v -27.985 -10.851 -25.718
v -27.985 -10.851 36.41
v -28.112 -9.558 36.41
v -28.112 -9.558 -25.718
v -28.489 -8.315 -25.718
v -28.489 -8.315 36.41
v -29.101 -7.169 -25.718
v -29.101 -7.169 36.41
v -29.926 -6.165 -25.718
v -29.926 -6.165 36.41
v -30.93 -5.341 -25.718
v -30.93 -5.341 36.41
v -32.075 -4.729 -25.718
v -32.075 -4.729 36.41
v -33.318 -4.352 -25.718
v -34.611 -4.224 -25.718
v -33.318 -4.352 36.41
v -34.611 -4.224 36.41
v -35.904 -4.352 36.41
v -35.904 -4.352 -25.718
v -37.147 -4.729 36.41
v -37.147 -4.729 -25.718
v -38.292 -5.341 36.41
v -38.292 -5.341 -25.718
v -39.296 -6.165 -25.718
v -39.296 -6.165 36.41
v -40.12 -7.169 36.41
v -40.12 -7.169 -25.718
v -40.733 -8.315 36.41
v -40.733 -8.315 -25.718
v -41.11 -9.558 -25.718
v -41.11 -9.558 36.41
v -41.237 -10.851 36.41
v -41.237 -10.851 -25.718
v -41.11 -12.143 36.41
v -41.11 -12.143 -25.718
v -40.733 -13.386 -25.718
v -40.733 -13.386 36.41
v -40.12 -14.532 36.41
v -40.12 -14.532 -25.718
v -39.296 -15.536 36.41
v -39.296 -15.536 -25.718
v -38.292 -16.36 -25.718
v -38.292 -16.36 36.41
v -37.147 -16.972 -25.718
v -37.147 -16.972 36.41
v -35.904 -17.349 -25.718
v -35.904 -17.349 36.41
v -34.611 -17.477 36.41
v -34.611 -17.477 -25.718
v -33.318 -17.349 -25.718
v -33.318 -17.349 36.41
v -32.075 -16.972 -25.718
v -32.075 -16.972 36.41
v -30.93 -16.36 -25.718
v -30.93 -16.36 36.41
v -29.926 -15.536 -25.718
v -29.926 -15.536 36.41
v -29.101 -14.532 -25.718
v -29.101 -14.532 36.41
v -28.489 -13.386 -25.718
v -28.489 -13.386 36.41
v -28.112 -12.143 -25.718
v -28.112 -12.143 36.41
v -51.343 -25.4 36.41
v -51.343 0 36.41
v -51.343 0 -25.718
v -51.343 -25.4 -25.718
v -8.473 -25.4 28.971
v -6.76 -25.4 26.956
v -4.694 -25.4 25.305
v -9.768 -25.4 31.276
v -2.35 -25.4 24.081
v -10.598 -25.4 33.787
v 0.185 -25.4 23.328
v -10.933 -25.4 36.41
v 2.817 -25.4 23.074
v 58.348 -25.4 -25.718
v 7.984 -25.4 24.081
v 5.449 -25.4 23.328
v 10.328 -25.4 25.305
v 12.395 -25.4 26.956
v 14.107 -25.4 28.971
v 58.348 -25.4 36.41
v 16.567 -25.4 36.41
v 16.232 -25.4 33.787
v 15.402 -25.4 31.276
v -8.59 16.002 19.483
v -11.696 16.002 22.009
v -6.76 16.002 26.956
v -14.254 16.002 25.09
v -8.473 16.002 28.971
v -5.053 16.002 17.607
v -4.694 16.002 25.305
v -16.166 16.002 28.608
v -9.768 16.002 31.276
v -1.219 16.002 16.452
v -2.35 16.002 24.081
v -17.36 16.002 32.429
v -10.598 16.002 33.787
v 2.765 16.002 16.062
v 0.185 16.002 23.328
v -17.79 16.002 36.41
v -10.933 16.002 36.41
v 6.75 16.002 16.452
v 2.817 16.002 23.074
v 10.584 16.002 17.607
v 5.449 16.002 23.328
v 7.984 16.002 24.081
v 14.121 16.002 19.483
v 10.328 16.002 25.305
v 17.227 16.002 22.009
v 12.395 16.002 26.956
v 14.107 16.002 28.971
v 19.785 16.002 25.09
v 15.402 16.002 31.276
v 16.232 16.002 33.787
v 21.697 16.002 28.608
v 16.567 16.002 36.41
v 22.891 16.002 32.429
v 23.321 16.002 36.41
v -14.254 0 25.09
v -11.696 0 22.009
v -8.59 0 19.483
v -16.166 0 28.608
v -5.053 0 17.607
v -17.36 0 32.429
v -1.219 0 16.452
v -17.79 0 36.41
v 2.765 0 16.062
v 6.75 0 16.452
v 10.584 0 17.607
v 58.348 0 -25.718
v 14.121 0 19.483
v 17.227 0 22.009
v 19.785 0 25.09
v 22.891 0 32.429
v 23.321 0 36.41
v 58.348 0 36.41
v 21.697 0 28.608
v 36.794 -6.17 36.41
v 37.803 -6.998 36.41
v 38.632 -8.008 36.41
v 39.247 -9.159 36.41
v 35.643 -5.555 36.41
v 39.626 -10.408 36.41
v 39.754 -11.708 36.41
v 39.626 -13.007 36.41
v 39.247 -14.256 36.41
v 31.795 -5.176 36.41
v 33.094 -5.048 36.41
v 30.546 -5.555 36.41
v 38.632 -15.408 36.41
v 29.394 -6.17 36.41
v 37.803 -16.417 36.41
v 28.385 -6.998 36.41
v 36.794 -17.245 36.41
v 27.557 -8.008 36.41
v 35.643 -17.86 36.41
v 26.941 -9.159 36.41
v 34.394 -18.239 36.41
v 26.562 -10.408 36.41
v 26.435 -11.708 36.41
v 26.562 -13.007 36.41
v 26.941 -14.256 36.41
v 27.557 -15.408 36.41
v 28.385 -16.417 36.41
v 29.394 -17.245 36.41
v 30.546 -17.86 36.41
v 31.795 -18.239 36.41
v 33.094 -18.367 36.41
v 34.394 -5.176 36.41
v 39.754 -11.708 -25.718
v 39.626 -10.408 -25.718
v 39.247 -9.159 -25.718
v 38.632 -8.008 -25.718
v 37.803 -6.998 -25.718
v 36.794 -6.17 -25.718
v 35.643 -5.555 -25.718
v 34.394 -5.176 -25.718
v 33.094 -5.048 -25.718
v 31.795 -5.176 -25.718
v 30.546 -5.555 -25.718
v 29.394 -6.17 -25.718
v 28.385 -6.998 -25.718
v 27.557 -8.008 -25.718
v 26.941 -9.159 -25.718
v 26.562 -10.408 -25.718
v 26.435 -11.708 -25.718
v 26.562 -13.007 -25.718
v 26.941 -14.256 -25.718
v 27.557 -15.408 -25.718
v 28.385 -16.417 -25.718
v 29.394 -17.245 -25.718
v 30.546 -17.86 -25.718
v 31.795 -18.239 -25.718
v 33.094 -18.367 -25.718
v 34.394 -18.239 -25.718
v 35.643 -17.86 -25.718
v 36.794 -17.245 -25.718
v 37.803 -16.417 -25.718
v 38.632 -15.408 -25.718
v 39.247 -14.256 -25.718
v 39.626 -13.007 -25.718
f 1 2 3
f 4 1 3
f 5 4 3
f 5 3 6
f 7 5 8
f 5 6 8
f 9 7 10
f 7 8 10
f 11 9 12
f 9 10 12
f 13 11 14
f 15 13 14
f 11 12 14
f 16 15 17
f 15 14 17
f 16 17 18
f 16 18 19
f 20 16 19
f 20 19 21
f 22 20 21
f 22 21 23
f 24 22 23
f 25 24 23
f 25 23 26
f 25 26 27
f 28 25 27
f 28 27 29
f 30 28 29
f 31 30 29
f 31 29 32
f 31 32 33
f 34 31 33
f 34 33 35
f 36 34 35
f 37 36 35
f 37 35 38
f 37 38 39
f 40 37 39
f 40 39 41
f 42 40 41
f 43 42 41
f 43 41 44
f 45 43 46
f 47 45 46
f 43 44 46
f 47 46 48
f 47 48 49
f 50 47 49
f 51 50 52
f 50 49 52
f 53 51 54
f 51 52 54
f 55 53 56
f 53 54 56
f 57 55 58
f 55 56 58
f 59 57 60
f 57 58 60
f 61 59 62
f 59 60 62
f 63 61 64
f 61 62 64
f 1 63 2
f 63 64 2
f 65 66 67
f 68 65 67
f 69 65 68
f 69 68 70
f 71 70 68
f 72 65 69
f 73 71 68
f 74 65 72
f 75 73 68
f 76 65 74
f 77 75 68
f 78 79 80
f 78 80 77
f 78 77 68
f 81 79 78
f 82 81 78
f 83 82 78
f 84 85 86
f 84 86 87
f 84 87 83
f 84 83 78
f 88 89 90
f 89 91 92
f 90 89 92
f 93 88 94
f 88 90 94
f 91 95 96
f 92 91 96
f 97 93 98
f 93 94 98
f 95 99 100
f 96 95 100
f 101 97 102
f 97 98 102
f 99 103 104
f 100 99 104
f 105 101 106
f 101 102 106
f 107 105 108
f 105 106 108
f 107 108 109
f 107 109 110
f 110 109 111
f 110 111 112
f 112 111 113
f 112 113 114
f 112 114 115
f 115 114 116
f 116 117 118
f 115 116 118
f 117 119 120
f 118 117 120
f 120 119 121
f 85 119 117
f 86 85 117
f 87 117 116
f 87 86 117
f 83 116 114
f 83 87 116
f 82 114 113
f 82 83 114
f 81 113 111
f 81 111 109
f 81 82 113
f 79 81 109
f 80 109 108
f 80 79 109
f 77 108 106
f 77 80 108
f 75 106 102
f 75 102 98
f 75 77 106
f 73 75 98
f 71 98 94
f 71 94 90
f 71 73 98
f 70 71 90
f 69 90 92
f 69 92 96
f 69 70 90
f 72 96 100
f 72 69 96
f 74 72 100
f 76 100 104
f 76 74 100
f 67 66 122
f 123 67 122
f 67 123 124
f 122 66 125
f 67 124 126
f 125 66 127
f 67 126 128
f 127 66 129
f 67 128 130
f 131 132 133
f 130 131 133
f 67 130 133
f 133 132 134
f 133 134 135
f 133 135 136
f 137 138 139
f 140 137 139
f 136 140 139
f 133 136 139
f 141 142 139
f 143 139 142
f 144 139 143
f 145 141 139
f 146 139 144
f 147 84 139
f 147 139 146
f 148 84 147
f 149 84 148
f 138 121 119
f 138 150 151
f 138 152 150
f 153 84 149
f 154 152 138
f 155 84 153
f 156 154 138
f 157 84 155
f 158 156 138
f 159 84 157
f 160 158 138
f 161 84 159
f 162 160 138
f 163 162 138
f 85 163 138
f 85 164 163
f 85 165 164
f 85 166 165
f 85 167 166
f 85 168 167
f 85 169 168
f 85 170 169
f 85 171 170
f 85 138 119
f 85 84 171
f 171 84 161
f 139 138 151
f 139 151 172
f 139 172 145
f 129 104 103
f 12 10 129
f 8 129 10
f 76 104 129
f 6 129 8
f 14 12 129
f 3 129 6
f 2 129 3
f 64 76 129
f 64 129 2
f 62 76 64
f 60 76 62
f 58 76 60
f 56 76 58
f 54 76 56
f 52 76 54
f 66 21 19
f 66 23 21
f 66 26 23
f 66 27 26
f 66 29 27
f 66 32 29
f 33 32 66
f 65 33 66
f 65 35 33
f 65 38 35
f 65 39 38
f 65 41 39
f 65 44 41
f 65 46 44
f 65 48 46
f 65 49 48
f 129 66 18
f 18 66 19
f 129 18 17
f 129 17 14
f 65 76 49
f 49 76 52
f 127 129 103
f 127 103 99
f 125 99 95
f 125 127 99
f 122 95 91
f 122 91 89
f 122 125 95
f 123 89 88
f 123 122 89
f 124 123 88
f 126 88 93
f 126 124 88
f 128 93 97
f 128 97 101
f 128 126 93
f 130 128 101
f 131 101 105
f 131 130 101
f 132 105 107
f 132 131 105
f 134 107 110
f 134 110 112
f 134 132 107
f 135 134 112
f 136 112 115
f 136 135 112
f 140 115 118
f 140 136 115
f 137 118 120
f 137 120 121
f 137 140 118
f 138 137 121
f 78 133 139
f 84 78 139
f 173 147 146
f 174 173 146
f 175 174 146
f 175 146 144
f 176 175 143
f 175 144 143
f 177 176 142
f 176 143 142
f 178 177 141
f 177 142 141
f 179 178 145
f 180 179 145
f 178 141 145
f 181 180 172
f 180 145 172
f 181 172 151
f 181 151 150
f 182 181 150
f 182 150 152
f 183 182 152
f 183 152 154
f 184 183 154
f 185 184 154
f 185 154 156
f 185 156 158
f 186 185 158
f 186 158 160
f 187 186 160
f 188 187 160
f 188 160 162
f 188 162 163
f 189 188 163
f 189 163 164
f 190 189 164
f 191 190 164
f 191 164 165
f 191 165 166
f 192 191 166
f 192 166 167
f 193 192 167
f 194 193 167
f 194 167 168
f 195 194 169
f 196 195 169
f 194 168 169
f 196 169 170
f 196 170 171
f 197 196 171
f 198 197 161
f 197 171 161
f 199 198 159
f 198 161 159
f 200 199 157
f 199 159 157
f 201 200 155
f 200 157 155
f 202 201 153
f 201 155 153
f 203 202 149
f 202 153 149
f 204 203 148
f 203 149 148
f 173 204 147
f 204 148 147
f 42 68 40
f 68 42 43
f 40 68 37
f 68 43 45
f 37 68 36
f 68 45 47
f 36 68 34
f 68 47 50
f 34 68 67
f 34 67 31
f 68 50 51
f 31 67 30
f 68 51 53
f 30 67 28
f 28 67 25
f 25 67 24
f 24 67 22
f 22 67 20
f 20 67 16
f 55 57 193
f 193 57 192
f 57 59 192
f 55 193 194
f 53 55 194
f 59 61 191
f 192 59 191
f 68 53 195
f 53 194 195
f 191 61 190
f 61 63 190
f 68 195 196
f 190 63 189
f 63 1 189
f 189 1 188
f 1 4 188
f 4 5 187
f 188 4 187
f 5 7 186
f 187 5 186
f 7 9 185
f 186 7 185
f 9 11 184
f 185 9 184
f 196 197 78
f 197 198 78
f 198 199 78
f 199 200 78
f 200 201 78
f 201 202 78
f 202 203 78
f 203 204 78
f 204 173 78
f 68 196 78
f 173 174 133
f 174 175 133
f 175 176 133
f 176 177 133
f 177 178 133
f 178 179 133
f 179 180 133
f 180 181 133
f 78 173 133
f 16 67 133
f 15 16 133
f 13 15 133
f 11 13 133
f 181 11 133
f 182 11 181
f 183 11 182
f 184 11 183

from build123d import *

# Parameters (mm, degrees)
F1_DEPTH = 25.4
F3_DEPTH = 41.402
F4_R     = 6.626183
F6_DEPTH = 212.598
F5_R     = 6.659783
F7_DEPTH = 146.05


with BuildPart() as f1:
    # F0 (on Front) → F1 (new body)
    with BuildSketch(Plane.XZ):
        with BuildLine():
            Line((-17.790243, 36.410082), (-51.342823, 36.410082))
            Line((-51.342823, 36.410082), (-51.342823, -25.717501))
            Line((-51.342823, -25.717501), (58.348302, -25.717501))
            Line((58.348302, -25.717501), (58.348302, 36.410082))
            Line((58.348302, 36.410082), (23.320885, 36.410082))
            ThreePointArc((23.320885, 36.410082), (2.765321, 16.062069), (-17.790243, 36.410082))
        make_face()
    extrude(amount=F1_DEPTH)

    # F2 (on face) → F3 (join)
    with BuildSketch(Plane.XZ.offset(25.4)):
        with BuildLine():
            Line((-10.932595, 36.410082), (-17.790243, 36.410082))
            ThreePointArc((-17.790243, 36.410082), (2.765321, 16.062069), (23.320885, 36.410082))
            Line((23.320885, 36.410082), (16.566781, 36.410082))
            ThreePointArc((16.566781, 36.410082), (2.817093, 23.073848), (-10.932595, 36.410082))
        make_face()
    extrude(amount=-F3_DEPTH)

    # F4 (on face) → F6 (cut)
    with BuildSketch(Plane.XY.offset(36.410082)):
        with Locations((-34.610964, -10.85051)):
            Circle(F4_R)
    extrude(amount=-F6_DEPTH, mode=Mode.SUBTRACT)

    # F5 (on face) → F7 (cut)
    with BuildSketch(Plane.XY.offset(36.410082)):
        with Locations((33.094294, -11.707598)):
            Circle(F5_R)
    extrude(amount=-F7_DEPTH, mode=Mode.SUBTRACT)


solid = f1.part
